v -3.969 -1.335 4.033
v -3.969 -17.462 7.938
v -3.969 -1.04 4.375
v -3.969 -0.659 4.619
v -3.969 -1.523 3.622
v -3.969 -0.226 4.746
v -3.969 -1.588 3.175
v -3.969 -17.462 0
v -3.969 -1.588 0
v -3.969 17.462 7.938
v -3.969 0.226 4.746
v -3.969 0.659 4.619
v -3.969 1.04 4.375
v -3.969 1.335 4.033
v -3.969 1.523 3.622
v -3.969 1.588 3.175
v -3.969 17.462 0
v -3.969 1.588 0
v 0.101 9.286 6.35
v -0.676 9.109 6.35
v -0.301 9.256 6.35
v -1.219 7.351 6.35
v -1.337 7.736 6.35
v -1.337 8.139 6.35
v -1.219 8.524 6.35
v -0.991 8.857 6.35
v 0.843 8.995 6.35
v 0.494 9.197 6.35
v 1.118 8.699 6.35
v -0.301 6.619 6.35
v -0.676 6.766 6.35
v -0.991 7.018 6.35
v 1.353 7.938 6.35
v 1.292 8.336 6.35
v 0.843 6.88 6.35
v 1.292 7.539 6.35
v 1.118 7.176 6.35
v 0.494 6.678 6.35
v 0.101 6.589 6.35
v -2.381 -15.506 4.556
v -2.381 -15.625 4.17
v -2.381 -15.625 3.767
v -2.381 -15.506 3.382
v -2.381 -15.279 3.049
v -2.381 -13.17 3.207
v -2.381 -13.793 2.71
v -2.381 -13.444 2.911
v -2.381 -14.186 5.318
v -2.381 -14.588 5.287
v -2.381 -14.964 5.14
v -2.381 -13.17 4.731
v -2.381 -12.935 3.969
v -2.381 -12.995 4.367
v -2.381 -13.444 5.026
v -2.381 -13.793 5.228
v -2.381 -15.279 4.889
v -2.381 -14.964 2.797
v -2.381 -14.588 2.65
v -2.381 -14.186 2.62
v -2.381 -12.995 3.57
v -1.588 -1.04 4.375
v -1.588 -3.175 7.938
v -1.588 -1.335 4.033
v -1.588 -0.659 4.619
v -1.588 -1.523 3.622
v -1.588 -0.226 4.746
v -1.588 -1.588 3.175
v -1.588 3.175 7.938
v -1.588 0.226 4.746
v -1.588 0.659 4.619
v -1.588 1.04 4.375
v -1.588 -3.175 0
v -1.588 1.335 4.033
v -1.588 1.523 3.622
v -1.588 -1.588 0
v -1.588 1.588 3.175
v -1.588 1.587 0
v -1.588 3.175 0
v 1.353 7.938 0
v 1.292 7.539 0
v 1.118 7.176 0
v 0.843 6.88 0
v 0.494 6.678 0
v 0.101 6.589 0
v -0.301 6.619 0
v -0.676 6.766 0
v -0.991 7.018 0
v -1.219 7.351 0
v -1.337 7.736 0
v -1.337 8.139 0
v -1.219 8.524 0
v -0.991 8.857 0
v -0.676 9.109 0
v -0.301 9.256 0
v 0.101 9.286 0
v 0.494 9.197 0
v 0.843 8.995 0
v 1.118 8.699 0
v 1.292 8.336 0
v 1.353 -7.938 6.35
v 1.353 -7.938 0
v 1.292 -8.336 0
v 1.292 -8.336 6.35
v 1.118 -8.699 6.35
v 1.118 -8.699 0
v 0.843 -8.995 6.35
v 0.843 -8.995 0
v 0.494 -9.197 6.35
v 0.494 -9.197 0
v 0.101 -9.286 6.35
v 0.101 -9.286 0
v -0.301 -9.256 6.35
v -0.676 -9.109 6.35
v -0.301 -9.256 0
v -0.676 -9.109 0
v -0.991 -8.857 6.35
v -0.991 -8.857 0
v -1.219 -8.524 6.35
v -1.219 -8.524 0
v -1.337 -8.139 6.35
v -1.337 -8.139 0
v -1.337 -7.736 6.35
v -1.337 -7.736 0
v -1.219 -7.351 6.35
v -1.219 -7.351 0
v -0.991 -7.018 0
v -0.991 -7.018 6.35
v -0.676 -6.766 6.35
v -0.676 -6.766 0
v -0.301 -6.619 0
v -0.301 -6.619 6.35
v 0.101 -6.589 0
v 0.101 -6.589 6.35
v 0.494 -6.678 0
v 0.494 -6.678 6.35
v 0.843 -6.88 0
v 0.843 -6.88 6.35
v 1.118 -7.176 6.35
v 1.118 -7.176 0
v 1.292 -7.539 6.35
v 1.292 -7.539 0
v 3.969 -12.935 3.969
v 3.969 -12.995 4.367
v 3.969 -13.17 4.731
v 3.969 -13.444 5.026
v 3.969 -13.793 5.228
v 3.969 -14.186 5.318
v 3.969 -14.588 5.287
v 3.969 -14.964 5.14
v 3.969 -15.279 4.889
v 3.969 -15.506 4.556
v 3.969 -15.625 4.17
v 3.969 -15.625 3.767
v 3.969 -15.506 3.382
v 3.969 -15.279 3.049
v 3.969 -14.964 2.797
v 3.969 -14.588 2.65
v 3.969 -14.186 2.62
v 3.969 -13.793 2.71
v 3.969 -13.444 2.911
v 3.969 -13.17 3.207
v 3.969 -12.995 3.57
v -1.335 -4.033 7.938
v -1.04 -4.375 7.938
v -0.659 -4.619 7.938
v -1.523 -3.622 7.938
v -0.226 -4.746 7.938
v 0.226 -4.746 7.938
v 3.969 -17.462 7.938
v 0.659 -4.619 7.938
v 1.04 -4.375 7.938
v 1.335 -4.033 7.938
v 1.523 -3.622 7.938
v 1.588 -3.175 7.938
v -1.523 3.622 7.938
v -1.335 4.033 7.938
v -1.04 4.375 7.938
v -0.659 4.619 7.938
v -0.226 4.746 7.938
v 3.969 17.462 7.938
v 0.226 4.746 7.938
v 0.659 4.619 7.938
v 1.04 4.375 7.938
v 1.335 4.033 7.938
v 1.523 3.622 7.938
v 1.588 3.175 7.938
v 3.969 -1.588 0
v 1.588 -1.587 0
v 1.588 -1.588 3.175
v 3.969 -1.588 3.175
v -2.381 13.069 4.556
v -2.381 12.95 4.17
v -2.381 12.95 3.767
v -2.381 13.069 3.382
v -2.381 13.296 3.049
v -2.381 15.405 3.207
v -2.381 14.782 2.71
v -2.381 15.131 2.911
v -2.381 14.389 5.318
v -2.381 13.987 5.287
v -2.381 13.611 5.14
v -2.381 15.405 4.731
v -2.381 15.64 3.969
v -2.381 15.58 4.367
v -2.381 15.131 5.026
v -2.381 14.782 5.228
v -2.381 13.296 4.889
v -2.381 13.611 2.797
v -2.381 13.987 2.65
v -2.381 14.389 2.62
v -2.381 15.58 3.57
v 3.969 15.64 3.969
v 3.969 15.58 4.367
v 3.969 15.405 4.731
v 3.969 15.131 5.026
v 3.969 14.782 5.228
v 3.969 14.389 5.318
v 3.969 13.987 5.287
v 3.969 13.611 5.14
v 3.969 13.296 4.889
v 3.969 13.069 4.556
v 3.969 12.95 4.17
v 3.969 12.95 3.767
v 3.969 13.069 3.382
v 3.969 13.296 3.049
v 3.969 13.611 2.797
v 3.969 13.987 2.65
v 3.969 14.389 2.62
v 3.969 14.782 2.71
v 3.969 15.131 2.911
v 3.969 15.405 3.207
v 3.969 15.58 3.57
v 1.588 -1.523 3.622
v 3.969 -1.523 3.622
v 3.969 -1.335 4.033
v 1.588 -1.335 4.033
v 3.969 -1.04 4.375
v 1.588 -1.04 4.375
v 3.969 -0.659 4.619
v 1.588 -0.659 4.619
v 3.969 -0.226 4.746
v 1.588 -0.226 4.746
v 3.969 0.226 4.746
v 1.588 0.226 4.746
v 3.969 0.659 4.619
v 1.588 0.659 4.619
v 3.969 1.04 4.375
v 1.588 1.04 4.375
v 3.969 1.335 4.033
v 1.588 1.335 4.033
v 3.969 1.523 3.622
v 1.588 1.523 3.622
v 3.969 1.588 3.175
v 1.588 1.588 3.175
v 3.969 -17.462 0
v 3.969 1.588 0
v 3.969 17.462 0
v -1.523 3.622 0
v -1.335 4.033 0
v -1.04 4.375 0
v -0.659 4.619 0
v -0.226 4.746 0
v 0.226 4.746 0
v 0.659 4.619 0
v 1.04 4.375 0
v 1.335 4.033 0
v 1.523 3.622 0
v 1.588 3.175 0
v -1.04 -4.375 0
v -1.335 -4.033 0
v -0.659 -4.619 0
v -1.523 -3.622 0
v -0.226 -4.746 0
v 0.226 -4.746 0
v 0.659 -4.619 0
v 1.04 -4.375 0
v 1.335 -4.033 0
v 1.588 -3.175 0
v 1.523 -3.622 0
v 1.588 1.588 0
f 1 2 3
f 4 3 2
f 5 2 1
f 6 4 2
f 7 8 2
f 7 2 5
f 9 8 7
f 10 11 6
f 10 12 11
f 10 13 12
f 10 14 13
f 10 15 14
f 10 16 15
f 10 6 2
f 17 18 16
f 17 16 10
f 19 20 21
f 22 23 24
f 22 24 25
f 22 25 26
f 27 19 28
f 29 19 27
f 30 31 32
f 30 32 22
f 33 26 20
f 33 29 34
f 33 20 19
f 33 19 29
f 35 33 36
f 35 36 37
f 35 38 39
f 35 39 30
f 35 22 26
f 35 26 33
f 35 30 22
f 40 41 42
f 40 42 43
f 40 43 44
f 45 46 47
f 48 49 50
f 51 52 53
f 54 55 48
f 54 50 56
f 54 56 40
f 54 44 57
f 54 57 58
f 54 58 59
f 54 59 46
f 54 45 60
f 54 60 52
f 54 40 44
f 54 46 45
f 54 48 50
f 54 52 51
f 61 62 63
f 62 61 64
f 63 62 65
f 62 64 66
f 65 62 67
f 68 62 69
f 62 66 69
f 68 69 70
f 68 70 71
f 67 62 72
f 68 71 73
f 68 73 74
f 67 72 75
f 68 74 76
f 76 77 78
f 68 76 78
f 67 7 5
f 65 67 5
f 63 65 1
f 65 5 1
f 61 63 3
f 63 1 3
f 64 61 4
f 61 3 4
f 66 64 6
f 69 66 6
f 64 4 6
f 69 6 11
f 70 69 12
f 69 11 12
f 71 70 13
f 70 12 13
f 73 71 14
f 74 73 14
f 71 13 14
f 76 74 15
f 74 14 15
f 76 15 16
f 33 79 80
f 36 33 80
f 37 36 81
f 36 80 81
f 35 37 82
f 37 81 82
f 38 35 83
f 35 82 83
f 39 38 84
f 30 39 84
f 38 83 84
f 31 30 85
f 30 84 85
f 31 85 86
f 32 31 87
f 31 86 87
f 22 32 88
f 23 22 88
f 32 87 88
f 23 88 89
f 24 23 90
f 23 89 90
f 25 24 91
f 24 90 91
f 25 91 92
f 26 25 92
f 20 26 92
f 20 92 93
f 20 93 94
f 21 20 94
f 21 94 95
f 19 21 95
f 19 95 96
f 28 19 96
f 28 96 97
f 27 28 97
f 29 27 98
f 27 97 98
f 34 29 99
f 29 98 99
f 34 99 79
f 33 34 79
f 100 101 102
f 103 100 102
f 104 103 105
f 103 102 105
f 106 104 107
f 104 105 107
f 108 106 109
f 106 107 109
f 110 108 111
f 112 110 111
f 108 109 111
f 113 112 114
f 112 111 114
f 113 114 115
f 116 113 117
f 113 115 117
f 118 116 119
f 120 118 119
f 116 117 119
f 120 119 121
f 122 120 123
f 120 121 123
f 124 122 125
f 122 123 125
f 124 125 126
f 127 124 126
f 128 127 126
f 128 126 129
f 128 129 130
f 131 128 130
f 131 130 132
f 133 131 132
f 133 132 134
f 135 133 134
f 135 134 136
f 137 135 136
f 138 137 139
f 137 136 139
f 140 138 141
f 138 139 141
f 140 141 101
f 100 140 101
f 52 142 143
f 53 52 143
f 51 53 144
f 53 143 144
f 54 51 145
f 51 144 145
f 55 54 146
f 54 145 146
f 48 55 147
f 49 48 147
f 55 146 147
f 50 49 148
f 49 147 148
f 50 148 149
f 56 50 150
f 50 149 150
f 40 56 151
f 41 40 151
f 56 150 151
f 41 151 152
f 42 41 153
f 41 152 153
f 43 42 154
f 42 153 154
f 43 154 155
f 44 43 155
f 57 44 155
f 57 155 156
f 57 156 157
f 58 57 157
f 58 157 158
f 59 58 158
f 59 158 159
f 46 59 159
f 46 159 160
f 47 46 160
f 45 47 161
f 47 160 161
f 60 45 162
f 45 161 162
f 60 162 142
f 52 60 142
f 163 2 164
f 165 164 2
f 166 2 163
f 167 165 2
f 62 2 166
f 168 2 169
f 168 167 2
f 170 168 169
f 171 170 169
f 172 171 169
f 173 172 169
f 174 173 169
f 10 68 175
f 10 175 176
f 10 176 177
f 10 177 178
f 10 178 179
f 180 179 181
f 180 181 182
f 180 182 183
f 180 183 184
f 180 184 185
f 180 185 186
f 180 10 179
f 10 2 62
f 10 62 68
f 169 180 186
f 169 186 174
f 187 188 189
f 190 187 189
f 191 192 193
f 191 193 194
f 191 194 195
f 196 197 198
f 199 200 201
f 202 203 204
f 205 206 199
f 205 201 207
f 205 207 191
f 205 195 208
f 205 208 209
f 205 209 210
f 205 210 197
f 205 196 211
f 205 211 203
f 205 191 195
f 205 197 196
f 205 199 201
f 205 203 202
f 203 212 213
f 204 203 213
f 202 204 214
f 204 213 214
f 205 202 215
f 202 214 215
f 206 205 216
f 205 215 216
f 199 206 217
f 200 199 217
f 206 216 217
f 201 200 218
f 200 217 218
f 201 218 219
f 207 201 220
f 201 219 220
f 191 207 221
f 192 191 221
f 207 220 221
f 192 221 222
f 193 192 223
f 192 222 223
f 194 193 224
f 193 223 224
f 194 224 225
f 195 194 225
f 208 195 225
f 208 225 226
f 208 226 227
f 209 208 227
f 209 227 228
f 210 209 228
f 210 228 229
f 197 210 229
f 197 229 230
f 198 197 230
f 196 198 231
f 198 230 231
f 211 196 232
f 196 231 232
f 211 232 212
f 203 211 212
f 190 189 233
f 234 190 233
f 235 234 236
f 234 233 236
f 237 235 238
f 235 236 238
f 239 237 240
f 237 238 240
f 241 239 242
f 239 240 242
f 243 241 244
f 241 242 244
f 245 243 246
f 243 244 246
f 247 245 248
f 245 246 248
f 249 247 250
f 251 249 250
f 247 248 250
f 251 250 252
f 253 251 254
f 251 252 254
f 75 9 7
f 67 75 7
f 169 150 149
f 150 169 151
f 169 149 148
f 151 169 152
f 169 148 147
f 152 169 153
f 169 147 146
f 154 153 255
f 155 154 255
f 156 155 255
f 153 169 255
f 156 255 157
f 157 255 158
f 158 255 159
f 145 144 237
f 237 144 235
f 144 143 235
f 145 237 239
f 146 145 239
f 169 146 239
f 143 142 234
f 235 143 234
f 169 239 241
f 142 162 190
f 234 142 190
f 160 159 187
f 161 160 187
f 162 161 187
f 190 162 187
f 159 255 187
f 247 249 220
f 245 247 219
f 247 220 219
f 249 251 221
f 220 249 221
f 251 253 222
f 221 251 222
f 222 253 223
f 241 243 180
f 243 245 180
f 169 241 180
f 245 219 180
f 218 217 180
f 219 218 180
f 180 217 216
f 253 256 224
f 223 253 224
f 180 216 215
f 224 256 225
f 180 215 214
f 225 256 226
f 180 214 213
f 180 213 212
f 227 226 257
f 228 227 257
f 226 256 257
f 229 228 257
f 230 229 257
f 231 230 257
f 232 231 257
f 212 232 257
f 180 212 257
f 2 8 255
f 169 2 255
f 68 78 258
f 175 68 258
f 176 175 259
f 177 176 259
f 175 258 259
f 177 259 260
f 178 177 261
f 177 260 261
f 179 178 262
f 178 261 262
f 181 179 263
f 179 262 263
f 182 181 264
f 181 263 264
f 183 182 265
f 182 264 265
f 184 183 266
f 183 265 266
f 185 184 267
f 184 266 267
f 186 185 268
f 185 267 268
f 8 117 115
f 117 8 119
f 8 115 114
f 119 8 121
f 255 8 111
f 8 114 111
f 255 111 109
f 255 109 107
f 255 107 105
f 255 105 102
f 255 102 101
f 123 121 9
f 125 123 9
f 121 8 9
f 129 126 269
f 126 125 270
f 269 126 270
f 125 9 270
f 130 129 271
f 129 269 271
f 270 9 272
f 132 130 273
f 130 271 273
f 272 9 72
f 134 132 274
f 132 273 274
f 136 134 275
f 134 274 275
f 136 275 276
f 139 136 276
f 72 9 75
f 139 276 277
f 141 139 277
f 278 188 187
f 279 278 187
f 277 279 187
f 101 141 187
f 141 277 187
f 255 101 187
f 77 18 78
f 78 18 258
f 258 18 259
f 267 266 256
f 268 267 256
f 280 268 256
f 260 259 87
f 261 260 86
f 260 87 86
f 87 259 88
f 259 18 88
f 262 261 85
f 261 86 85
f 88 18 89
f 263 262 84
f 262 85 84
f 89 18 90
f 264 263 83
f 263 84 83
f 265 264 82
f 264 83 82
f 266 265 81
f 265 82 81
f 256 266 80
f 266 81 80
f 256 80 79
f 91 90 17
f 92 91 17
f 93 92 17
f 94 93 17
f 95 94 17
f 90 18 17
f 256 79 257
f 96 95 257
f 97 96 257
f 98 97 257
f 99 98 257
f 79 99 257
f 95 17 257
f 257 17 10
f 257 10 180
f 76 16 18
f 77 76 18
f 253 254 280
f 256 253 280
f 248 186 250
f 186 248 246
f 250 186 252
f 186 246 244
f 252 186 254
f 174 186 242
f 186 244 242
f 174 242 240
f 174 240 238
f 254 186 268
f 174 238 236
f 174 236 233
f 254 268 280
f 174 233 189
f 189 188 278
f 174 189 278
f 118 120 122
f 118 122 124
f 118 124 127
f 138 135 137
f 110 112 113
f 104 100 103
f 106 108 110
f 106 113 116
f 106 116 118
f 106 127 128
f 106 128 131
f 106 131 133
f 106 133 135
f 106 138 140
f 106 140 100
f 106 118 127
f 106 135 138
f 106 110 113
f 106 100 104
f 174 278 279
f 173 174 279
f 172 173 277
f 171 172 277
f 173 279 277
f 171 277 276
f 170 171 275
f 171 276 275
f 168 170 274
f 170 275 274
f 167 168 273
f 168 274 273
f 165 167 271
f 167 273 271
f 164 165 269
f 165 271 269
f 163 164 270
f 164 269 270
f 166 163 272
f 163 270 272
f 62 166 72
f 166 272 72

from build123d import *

# Parameters (mm, degrees)
F0_W     = 7.9375
F0_H     = 34.925
F1_DEPTH = 7.9375
F2_R     = 1.35255
F3_DEPTH = 6.35
F4_R     = 1.35255
F5_DEPTH = 6.35
F7_DEPTH = 7.9375


with BuildPart() as f1:
    # F0 (on Top) → F1 (new body)
    with BuildSketch(Plane.XY):
        Rectangle(F0_W, F0_H)
        with BuildLine():
            Line((1.5875, 3.175), (1.5875, -3.175))
            ThreePointArc((1.5875, -3.175), (0, -4.7625), (-1.5875, -3.175))
            Line((-1.5875, -3.175), (-1.5875, 3.175))
            ThreePointArc((-1.5875, 3.175), (0, 4.7625), (1.5875, 3.175))
        make_face(mode=Mode.SUBTRACT)
    extrude(amount=F1_DEPTH)

    # F2 (on face) → F3 (cut)
    with BuildSketch(Plane(origin=(0, 0, 0), x_dir=(1, 0, 0), z_dir=(0, 0, -1))):
        with Locations((0, -7.9375)):
            Circle(F2_R)
        with Locations((0, 7.9375)):
            Circle(F2_R)
    extrude(amount=-F3_DEPTH, mode=Mode.SUBTRACT)

    # F4 (on face) → F5 (cut)
    with BuildSketch(Plane.YZ.offset(3.96875)):
        with Locations((14.2875, 3.96875)):
            Circle(F4_R)
        with Locations((-14.2875, 3.96875)):
            Circle(F4_R)
    extrude(amount=-F5_DEPTH, mode=Mode.SUBTRACT)

    # F6 (on face) → F7 (cut, through all)
    with BuildSketch(Plane(origin=(-3.96875, 0, 0), x_dir=(0, -1, 0), z_dir=(-1, 0, 0))):
        with BuildLine():
            Line((-1.5875, 3.175), (-1.5875, 0))
            Line((-1.5875, 0), (1.5875, 0))
            Line((1.5875, 0), (1.5875, 3.175))
            ThreePointArc((1.5875, 3.175), (0, 4.7625), (-1.5875, 3.175))
        make_face()
    extrude(amount=-F7_DEPTH, mode=Mode.SUBTRACT)


solid = f1.part
